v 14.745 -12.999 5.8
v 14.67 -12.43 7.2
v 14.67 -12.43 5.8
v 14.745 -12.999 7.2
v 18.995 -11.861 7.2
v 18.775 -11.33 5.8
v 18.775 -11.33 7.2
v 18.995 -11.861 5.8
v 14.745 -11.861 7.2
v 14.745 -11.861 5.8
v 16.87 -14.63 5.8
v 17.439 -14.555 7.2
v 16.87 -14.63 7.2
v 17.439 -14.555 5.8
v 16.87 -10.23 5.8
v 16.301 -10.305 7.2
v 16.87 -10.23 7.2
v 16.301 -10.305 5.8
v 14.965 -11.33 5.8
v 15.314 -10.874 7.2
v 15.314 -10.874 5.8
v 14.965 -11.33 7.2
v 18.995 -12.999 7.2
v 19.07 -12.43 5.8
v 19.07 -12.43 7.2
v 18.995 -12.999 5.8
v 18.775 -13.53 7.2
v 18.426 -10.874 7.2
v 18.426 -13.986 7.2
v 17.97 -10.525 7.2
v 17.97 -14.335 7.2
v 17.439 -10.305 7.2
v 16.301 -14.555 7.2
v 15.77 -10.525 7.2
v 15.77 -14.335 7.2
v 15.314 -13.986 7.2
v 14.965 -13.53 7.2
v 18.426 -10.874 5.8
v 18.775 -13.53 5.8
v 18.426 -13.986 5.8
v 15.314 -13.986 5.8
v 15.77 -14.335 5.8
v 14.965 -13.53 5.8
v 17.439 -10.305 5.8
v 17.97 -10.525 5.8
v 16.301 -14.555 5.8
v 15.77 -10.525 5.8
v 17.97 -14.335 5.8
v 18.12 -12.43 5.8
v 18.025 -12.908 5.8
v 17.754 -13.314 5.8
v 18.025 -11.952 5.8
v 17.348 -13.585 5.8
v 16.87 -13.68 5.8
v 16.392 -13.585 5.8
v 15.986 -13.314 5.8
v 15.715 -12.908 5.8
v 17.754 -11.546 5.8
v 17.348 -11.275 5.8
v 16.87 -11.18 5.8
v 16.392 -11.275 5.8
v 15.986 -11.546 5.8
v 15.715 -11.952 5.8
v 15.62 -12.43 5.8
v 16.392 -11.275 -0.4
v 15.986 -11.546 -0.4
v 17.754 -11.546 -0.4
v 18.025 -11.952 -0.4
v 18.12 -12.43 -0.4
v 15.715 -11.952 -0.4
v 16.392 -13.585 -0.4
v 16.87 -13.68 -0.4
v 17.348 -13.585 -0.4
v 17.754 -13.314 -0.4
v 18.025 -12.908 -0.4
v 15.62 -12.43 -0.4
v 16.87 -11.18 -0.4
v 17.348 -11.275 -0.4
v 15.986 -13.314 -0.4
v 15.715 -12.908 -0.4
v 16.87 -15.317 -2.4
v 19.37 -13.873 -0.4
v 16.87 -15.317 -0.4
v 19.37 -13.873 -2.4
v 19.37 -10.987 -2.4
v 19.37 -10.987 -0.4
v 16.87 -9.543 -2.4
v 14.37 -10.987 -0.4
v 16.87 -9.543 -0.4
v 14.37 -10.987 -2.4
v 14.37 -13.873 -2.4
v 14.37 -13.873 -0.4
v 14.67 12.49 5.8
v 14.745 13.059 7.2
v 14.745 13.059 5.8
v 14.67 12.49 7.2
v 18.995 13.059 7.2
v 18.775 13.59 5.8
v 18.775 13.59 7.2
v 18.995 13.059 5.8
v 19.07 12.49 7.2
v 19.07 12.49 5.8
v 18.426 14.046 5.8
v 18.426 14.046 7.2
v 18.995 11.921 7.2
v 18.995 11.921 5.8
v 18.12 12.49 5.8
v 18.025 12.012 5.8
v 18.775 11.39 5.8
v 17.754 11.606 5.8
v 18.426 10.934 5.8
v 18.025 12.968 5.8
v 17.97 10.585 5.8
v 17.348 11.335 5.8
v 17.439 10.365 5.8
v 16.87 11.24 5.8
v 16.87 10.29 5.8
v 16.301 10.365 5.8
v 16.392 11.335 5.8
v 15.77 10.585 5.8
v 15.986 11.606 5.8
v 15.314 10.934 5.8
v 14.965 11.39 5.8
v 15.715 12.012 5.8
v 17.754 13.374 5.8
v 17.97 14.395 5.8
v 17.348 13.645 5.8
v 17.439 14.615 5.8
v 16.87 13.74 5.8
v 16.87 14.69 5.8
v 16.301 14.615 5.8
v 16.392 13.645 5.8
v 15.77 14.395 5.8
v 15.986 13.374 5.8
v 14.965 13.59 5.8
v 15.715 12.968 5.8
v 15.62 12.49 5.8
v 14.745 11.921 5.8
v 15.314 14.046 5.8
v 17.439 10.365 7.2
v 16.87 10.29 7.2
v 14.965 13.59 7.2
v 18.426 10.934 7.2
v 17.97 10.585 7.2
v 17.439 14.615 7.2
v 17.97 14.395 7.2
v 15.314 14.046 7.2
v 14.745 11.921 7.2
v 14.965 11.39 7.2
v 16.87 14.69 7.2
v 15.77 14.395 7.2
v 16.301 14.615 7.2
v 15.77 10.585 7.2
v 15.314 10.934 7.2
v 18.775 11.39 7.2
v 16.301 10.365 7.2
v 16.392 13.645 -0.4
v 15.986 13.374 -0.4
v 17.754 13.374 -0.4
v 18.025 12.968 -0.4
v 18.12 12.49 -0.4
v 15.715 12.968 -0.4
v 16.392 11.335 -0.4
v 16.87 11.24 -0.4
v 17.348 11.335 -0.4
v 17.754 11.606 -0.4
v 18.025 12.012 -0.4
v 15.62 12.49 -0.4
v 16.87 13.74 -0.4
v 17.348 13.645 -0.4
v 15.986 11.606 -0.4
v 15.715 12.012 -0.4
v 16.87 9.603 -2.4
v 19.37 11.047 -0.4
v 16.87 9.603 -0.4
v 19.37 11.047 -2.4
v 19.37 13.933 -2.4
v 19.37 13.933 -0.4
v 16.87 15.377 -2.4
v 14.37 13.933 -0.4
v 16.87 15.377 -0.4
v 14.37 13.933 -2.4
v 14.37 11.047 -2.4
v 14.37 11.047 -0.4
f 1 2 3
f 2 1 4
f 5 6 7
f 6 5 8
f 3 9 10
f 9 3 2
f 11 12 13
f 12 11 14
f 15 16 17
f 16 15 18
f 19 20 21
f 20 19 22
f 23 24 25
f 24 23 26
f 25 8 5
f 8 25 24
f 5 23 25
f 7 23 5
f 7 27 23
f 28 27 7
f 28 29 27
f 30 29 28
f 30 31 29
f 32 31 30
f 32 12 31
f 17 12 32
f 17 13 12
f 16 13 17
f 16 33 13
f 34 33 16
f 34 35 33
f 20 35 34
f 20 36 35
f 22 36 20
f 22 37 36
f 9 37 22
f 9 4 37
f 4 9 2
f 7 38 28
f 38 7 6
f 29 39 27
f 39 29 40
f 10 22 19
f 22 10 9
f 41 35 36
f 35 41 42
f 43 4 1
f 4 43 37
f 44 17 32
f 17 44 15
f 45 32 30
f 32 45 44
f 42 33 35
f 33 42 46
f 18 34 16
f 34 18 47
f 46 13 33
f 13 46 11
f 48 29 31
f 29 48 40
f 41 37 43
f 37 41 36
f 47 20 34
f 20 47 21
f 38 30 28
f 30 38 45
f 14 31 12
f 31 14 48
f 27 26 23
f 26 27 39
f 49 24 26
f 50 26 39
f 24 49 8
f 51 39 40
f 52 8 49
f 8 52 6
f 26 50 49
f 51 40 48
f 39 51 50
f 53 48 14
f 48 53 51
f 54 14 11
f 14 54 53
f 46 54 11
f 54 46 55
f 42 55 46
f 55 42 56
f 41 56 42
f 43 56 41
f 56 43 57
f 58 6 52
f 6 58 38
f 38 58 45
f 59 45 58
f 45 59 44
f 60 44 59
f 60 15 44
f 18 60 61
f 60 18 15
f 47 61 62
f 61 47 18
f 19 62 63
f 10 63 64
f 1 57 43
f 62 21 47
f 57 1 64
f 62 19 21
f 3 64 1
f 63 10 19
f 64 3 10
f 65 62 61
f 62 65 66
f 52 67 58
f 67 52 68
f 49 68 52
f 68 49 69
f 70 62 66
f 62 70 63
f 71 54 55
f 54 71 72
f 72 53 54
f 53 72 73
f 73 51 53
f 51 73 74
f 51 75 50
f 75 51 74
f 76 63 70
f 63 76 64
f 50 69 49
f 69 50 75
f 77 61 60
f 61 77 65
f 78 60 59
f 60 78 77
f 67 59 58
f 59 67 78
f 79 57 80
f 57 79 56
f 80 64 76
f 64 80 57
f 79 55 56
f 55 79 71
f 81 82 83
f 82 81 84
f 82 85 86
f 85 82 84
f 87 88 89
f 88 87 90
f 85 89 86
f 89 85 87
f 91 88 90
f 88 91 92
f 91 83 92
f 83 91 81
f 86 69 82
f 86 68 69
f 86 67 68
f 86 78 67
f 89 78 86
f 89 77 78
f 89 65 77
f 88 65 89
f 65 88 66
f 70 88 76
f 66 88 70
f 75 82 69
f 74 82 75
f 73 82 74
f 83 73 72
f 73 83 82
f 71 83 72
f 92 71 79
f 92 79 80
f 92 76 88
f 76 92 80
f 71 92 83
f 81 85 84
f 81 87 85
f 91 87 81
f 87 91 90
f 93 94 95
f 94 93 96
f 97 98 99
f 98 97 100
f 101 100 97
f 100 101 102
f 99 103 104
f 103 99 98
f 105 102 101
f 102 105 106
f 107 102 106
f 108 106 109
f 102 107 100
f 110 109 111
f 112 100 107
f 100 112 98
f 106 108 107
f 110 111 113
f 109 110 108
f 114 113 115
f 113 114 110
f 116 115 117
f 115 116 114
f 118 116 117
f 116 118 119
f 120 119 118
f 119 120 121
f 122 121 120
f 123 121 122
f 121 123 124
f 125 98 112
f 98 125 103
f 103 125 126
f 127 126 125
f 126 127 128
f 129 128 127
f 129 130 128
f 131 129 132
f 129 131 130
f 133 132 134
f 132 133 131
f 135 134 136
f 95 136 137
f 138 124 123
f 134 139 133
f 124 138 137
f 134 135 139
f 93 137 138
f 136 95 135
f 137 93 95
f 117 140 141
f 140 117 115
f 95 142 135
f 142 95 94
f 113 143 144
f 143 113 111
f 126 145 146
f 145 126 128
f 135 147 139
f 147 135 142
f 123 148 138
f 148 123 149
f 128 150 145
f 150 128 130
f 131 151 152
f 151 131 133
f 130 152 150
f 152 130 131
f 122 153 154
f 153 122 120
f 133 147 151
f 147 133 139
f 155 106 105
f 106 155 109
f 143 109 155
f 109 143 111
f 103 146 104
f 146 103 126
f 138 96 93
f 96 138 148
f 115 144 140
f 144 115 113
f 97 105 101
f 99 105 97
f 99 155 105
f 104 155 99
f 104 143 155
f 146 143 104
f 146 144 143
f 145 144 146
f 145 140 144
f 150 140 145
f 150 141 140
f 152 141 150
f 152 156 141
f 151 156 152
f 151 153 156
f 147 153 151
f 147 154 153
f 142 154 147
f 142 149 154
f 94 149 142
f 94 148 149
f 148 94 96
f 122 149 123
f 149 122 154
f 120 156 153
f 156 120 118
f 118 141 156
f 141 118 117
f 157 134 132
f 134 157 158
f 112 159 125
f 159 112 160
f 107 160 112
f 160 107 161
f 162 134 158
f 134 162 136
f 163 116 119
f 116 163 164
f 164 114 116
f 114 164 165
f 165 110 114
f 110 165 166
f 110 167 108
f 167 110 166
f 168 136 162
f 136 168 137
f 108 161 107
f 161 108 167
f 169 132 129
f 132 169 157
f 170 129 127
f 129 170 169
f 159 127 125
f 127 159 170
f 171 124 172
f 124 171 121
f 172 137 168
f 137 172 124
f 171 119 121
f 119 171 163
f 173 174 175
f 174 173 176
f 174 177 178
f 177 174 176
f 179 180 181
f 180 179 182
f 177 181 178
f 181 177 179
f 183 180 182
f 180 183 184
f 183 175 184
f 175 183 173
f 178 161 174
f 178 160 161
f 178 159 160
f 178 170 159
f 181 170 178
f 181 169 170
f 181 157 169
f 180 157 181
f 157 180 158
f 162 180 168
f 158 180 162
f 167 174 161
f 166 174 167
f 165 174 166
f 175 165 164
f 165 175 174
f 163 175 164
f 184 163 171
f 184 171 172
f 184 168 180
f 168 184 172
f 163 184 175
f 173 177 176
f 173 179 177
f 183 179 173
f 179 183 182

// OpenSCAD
// file: ../../screw-post/screw-post.scad
//-----------------------------------------------------------------------
// Screw post: a round post off the floor that a board screws down onto
//
// Two ways to fix:
//   "nut"  clearance hole through the post and floor; the nut sits in a hex
//          trap in the floor's underside, so the screw goes in from the top
//   "tap"  a pilot hole the screw cuts its own thread in (one or two fittings
//          in PLA/PETG); blind, the floor stays whole underneath
// and "head" for a screw up from below (head in a counterbore, nut on top).
//
// Modules, all in the same frame:
//   screwPostGhost()     the screw (and nut), for previews
//   screwPost()          the post: add to the floor
//   screwPostFloorCut()  subtract from the floor: nut trap / counterbore and hole
//
// Frame: origin on the floor top, on the post's axis. Z up; the floor is
// Z = -floorThick .. 0. Units: mm.
//
// Sizes: "M2", "M2.5", "M3". screwPostScrew(size, ...) says which screw length
// reaches, so a project can assert it has that screw in the kit.
//-----------------------------------------------------------------------

//-- [name, screw Ø, nut across flats, nut thick, head Ø, head height, tap hole, post Ø]
//-- Nuts ISO 4032; heads ISO 7380 button. Tap holes: the usual ~0.8 x Ø for plastic
screwSizes = [
  ["M2",   2.0, 4.0, 1.6, 3.5, 1.1, 1.6, 5.0],
  ["M2.5", 2.5, 5.0, 2.0, 4.4, 1.4, 2.1, 6.0],    // head 4.4: measured on the kit's M2.5 (controller base)
  ["M3",   3.0, 5.5, 2.4, 5.7, 1.65, 2.5, 7.0],
];

screwHoleClear = 0.4;     // added to the screw Ø for a clearance hole
screwNutClear  = 0.3;     // CAL: across flats, nut trap over the nut. Set by the fit piece
screwTapClear  = 0.0;     // CAL: added to the tap hole. Set by the fit piece
screwHeadClear = 0.6;     // counterbore over the head Ø

function screwSize(size) = let (i = search([size], screwSizes)[0])
  assert(i != [] && i != undef, str("unknown screw size ", size)) screwSizes[i];
function screwDia(size)    = screwSize(size)[1];
function screwNutAF(size)  = screwSize(size)[2];
function screwNutH(size)   = screwSize(size)[3];
function screwHeadDia(size)= screwSize(size)[4];
function screwHeadH(size)  = screwSize(size)[5];
function screwPostDia(size)= screwSize(size)[7];

//-- Shortest screw that fills the nut, from the top of the clamped part (h + clamp
//-- above the floor) down to the nut trap's underside. Round up to a length you have.
function screwPostScrew(size, h, floorThick, clamp = 1.6) = h + clamp + floorThick;

module screwPostGhost(size, h, floorThick, clamp = 1.6, length, how = "nut")
{
  d = screwDia(size);
  L = is_undef(length) ? screwPostScrew(size, h, floorThick, clamp) : length;
  top = h + clamp;
  if (how == "head")
  {
    %color("Silver") translate([0, 0, -floorThick]) cylinder(d = screwHeadDia(size), h = screwHeadH(size), $fn = 24);
    %color("Silver") translate([0, 0, -floorThick + screwHeadH(size)]) cylinder(d = d, h = L, $fn = 16);
  }
  else
  {
    %color("Silver") translate([0, 0, top]) cylinder(d = screwHeadDia(size), h = screwHeadH(size), $fn = 24);
    %color("Silver") translate([0, 0, top - L]) cylinder(d = d, h = L, $fn = 16);
    if (how == "nut")
      %color("DimGray") translate([0, 0, -floorThick]) rotate([0, 0, 30]) cylinder(d = screwNutAF(size)/cos(30), h = screwNutH(size), $fn = 6);
  }
}

//-- how: "nut" | "head" (through hole) or "tap" (blind pilot hole). postDia defaults by size
module screwPost(size, h, how = "nut", postDia, tapClear = screwTapClear)
{
  pd = is_undef(postDia) ? screwPostDia(size) : postDia;
  hole = how == "tap" ? screwSize(size)[6] + tapClear : screwDia(size) + screwHoleClear;
  difference()
  {
    translate([0, 0, -0.01]) cylinder(d = pd, h = h + 0.01, $fn = 40);
    translate([0, 0, how == "tap" ? 0.6 : -1]) cylinder(d = hole, h = h + 2, $fn = 24);
    //-- lead-in so the screw starts square
    translate([0, 0, h - 0.4]) cylinder(d1 = hole, d2 = hole + 0.8, h = 0.41, $fn = 24);
  }
}

//-- "nut": hex trap from the underside, opening a little over the nut so it sits flush.
//-- "head": counterbore for the head. "tap": nothing.
module screwPostFloorCut(size, floorThick, how = "nut", nutClear = screwNutClear)
{
  d = screwDia(size) + screwHoleClear;
  if (how == "nut")
  {
    af = screwNutAF(size) + nutClear;
    translate([0, 0, -floorThick - 1]) rotate([0, 0, 30]) cylinder(d = af/cos(30), h = screwNutH(size) + 0.1 + 1, $fn = 6);
    translate([0, 0, -floorThick - 1]) cylinder(d = d + 0.4, h = floorThick + 2, $fn = 24);
  }
  if (how == "head")
  {
    translate([0, 0, -floorThick - 1]) cylinder(d = screwHeadDia(size) + screwHeadClear, h = screwHeadH(size) + 0.2 + 1, $fn = 32);
    translate([0, 0, -floorThick - 1]) cylinder(d = d + 0.4, h = floorThick + 2, $fn = 24);
  }
  assert(how == "tap" || floorThick >= (how == "nut" ? screwNutH(size) : screwHeadH(size)) + 0.1 + 0.3,
         str("floor too thin for the ", size, " ", how));
}
// main file
// The two M2.5 screws and nuts as solids, for the catalogue.
use <../rj45-breakout.scad>
use <../../screw-post/screw-post.scad>

board = "pihut-106592"; wall = 2.0; postH = 4.2; floorThick = 2.4; pcb = 1.6;
L = 8;
for (h = rj45HolesXY(wall, board))
  translate([h[0], h[1], 0])
  {
    translate([0, 0, postH + pcb]) cylinder(d = screwHeadDia("M2.5"), h = screwHeadH("M2.5"), $fn = 24);
    translate([0, 0, postH + pcb - L]) cylinder(d = screwDia("M2.5"), h = L + 0.01, $fn = 16);
    translate([0, 0, -floorThick]) rotate([0, 0, 30]) cylinder(d = screwNutAF("M2.5")/cos(30), h = screwNutH("M2.5"), $fn = 6);
  }
